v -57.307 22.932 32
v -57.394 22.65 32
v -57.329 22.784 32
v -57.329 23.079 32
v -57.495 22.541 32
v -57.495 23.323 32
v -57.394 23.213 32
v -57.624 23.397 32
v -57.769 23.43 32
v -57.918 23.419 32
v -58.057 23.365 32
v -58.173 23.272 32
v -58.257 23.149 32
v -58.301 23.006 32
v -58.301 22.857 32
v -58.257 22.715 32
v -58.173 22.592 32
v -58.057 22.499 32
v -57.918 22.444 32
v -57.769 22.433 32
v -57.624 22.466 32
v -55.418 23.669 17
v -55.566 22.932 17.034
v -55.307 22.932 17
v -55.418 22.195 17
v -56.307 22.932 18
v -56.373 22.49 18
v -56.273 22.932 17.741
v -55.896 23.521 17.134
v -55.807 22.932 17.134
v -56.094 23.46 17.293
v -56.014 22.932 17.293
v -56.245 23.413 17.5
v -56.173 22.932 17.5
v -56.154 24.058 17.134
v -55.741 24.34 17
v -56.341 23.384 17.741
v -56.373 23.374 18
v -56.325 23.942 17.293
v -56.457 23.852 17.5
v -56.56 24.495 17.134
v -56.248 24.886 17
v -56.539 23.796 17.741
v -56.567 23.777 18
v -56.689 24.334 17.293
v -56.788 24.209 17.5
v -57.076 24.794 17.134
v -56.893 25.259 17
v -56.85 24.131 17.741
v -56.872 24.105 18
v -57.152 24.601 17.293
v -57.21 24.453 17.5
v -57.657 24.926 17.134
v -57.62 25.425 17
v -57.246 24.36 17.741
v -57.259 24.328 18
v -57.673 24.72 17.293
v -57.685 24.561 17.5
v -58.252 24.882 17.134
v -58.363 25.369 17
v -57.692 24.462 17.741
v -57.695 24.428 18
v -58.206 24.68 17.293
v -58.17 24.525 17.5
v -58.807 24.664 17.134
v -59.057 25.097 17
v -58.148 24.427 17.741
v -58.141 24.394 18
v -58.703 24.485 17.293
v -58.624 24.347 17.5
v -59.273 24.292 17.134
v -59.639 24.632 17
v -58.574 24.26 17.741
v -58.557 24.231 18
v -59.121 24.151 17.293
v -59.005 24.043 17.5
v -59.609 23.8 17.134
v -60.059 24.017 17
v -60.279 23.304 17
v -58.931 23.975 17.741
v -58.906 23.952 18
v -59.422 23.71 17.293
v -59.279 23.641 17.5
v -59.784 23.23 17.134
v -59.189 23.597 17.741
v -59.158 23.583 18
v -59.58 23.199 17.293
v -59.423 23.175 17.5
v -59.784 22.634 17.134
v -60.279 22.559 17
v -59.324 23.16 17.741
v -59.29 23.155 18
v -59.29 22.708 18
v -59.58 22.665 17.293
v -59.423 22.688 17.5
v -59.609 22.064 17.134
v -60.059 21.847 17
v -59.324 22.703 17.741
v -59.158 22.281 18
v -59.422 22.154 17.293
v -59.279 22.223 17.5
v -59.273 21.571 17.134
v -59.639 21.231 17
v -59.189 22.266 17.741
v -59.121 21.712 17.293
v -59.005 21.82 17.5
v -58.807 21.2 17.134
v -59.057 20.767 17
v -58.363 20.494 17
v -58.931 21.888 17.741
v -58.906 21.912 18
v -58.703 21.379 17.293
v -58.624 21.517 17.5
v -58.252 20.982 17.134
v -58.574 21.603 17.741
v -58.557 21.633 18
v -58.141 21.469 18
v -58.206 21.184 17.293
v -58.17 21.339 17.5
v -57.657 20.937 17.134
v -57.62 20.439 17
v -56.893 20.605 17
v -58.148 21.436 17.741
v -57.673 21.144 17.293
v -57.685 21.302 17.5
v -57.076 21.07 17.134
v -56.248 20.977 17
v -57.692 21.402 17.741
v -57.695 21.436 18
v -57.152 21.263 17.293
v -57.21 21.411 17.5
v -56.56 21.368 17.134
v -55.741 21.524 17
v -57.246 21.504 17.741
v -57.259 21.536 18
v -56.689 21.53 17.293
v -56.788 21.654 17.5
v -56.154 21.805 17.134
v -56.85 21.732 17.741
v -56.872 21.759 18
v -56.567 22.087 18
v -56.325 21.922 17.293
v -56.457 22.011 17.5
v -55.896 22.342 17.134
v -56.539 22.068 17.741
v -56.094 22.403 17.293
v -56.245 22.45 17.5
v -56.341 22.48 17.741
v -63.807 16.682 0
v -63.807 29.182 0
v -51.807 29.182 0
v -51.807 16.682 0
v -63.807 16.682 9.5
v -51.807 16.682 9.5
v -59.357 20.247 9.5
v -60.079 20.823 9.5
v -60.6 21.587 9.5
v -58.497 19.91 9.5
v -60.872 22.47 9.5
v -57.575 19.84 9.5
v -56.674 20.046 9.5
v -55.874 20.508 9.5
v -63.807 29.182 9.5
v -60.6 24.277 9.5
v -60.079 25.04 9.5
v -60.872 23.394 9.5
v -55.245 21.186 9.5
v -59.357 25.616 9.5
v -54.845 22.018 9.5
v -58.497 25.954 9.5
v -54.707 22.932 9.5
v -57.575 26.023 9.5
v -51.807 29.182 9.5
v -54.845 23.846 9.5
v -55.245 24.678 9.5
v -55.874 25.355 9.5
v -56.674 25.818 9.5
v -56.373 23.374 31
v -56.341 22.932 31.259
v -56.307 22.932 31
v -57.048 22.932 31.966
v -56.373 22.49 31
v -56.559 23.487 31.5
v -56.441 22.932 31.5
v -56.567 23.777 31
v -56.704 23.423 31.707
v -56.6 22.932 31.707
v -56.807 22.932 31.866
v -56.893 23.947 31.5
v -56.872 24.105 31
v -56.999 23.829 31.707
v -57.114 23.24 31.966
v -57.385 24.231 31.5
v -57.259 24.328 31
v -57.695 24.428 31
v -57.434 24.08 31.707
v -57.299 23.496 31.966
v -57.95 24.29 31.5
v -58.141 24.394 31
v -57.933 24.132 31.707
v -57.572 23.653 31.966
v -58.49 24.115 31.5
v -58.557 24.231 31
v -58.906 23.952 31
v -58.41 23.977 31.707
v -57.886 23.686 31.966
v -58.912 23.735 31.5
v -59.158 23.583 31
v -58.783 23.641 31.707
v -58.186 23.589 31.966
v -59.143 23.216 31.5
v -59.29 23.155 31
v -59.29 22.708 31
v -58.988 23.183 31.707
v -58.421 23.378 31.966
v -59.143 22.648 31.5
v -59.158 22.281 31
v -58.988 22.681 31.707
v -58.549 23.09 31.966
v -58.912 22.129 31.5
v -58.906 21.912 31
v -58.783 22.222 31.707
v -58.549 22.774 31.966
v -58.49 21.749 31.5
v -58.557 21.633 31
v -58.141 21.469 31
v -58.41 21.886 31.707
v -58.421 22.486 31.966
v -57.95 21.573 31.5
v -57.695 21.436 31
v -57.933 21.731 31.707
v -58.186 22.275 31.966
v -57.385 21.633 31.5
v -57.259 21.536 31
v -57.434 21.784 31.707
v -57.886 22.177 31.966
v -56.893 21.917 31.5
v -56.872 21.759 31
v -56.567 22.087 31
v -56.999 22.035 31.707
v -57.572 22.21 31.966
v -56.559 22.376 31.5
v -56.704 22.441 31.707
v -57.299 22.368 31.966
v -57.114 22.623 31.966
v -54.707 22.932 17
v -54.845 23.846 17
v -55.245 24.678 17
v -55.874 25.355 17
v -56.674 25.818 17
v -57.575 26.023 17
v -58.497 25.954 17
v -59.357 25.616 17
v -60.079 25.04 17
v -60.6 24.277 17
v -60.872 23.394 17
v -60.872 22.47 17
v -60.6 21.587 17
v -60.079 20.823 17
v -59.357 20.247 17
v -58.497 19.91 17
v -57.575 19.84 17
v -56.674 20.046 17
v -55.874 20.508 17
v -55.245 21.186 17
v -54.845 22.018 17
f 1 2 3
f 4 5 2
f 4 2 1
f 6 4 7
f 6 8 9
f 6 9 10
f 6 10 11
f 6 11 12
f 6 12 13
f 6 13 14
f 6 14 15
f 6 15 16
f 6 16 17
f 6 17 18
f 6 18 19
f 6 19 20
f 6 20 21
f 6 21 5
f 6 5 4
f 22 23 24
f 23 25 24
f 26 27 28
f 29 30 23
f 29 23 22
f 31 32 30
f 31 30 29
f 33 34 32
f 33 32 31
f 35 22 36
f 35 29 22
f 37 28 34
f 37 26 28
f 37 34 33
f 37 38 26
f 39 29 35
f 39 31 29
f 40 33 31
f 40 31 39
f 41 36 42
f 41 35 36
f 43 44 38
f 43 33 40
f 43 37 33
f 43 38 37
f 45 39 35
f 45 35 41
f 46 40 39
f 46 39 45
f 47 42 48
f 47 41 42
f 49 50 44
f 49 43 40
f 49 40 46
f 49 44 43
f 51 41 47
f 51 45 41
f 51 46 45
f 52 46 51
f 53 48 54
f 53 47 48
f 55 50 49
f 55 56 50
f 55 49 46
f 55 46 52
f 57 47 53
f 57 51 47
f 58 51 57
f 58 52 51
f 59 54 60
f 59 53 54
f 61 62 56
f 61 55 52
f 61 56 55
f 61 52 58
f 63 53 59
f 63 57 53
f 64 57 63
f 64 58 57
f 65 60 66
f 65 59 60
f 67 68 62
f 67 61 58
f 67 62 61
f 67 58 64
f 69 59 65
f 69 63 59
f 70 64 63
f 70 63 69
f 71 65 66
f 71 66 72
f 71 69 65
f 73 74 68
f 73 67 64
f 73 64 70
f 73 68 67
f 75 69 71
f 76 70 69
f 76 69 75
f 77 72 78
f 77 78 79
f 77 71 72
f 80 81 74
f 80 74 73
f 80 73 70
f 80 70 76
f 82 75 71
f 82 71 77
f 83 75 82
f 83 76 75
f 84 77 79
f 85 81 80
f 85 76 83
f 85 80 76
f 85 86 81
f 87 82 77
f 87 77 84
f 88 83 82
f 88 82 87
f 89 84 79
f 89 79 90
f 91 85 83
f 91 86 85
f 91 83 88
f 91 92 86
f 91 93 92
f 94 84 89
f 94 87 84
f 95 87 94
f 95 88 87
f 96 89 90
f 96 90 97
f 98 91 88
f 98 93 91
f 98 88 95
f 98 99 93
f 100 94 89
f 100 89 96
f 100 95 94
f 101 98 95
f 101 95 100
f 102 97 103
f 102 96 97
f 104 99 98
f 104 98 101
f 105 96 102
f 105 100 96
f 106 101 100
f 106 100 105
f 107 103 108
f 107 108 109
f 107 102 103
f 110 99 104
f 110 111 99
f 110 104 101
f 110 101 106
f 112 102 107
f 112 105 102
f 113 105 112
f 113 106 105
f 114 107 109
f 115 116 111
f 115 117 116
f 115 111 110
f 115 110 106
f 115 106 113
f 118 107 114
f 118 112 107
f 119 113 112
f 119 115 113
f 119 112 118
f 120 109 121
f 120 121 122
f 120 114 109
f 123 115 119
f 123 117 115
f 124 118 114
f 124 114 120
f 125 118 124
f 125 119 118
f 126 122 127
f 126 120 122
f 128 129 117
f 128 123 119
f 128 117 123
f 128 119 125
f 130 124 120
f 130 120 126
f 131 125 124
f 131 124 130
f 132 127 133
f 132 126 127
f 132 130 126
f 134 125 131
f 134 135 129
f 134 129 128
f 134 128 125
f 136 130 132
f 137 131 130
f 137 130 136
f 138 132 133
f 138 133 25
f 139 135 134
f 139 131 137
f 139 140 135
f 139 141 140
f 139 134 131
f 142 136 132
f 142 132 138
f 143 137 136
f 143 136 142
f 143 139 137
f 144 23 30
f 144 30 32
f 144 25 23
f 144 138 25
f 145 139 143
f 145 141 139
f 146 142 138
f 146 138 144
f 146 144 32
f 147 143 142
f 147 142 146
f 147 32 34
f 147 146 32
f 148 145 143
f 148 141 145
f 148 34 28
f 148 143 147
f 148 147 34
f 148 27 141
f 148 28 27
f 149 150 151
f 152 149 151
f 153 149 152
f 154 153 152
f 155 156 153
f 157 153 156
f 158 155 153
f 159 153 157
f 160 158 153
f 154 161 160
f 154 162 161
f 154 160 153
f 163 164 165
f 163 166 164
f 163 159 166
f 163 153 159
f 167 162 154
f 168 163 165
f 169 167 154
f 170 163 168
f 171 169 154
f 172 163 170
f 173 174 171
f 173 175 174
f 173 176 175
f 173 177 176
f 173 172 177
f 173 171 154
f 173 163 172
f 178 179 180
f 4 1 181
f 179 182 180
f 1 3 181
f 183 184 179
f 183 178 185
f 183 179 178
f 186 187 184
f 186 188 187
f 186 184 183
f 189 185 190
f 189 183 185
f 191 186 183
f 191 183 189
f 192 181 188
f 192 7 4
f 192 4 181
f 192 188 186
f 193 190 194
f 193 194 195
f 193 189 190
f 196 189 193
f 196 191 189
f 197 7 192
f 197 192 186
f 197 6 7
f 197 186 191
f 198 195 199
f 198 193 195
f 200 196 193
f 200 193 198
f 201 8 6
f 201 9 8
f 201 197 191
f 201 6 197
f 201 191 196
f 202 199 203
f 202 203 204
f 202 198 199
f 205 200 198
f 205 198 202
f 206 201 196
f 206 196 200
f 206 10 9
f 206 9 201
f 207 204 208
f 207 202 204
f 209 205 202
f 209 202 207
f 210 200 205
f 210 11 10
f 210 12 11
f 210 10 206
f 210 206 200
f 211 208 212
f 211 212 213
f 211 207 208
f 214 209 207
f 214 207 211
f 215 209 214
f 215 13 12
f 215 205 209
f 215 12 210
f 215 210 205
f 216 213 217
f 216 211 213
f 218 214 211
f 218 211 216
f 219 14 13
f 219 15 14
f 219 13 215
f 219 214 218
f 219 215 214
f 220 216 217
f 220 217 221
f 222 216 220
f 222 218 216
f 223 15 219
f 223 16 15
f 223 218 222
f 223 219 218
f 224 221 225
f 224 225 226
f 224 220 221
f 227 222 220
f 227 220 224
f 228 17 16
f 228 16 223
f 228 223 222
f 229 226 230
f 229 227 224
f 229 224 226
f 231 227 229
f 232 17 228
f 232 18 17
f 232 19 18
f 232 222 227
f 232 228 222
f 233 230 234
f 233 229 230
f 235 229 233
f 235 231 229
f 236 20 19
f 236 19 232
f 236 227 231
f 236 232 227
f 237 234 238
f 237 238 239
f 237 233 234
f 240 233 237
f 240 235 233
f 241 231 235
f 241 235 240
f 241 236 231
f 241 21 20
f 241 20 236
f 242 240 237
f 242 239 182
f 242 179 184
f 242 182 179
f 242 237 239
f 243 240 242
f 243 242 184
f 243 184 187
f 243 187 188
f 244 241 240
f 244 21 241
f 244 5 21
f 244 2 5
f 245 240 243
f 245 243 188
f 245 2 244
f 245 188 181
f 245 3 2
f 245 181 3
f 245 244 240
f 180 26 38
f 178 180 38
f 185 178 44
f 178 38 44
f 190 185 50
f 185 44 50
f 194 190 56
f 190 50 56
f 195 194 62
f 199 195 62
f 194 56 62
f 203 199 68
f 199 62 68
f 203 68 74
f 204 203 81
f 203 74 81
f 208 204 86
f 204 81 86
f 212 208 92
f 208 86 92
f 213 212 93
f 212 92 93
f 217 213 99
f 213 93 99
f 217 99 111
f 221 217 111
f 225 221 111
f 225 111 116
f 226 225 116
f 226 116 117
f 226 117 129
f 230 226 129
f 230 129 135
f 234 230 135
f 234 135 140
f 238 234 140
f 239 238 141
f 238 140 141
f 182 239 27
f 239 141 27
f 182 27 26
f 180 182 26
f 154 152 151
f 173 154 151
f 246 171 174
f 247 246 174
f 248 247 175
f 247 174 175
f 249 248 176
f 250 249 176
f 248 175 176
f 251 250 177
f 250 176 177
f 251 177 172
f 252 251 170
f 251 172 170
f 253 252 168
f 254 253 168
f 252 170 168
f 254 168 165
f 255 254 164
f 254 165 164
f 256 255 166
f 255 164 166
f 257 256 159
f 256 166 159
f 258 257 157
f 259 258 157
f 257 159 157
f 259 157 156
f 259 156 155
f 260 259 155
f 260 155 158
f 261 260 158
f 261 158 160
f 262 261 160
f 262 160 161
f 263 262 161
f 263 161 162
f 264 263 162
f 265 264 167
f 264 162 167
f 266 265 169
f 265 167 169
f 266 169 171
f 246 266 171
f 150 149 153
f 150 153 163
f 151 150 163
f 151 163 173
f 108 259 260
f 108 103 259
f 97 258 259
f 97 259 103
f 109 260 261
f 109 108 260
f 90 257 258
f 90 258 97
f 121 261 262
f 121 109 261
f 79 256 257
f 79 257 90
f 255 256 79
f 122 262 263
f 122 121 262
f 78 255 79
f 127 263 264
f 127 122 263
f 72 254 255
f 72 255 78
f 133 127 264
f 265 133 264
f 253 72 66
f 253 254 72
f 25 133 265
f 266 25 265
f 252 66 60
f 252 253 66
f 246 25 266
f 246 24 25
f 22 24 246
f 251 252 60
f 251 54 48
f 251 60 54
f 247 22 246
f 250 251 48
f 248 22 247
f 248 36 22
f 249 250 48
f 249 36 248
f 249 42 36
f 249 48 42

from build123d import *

# Parameters (mm, degrees)
ESQUISSE1_W        = 12
ESQUISSE1_H        = 12.5
BOSS_EXTRU_1_DEPTH = 9.5
ESQUISSE3_R        = 3.1
BOSS_EXTRU_2_DEPTH = 7.5
ESQUISSE4_R        = 1.5
BOSS_EXTRU_3_DEPTH = 15
CONG_3_R           = 1


with BuildPart() as part:
    # Esquisse1 → Boss.-Extru.1 (new body)
    with BuildSketch(Plane.XY):
        with Locations((-57.806805708, 22.931818182)):
            Rectangle(ESQUISSE1_W, ESQUISSE1_H)
    extrude(amount=BOSS_EXTRU_1_DEPTH)

    # Esquisse3 → Boss.-Extru.2 (add)
    with BuildSketch(Plane.XY.offset(9.5)):
        with Locations((-57.806805708, 22.931818182)):
            Circle(ESQUISSE3_R)
    extrude(amount=BOSS_EXTRU_2_DEPTH)

    # Esquisse4 → Boss.-Extru.3 (add)
    with BuildSketch(Plane.XY.offset(17)):
        with Locations((-57.806805708, 22.931818182)):
            Circle(ESQUISSE4_R)
    extrude(amount=BOSS_EXTRU_3_DEPTH)

    # Congé3
    cong_3_edges = [part.edges().sort_by_distance(p)[0] for p in [
        (-59.306805708, 22.931818182, 17),
        (-59.306805708, 22.931818182, 32),
    ]]
    fillet(cong_3_edges, radius=CONG_3_R)


solid = part.part
